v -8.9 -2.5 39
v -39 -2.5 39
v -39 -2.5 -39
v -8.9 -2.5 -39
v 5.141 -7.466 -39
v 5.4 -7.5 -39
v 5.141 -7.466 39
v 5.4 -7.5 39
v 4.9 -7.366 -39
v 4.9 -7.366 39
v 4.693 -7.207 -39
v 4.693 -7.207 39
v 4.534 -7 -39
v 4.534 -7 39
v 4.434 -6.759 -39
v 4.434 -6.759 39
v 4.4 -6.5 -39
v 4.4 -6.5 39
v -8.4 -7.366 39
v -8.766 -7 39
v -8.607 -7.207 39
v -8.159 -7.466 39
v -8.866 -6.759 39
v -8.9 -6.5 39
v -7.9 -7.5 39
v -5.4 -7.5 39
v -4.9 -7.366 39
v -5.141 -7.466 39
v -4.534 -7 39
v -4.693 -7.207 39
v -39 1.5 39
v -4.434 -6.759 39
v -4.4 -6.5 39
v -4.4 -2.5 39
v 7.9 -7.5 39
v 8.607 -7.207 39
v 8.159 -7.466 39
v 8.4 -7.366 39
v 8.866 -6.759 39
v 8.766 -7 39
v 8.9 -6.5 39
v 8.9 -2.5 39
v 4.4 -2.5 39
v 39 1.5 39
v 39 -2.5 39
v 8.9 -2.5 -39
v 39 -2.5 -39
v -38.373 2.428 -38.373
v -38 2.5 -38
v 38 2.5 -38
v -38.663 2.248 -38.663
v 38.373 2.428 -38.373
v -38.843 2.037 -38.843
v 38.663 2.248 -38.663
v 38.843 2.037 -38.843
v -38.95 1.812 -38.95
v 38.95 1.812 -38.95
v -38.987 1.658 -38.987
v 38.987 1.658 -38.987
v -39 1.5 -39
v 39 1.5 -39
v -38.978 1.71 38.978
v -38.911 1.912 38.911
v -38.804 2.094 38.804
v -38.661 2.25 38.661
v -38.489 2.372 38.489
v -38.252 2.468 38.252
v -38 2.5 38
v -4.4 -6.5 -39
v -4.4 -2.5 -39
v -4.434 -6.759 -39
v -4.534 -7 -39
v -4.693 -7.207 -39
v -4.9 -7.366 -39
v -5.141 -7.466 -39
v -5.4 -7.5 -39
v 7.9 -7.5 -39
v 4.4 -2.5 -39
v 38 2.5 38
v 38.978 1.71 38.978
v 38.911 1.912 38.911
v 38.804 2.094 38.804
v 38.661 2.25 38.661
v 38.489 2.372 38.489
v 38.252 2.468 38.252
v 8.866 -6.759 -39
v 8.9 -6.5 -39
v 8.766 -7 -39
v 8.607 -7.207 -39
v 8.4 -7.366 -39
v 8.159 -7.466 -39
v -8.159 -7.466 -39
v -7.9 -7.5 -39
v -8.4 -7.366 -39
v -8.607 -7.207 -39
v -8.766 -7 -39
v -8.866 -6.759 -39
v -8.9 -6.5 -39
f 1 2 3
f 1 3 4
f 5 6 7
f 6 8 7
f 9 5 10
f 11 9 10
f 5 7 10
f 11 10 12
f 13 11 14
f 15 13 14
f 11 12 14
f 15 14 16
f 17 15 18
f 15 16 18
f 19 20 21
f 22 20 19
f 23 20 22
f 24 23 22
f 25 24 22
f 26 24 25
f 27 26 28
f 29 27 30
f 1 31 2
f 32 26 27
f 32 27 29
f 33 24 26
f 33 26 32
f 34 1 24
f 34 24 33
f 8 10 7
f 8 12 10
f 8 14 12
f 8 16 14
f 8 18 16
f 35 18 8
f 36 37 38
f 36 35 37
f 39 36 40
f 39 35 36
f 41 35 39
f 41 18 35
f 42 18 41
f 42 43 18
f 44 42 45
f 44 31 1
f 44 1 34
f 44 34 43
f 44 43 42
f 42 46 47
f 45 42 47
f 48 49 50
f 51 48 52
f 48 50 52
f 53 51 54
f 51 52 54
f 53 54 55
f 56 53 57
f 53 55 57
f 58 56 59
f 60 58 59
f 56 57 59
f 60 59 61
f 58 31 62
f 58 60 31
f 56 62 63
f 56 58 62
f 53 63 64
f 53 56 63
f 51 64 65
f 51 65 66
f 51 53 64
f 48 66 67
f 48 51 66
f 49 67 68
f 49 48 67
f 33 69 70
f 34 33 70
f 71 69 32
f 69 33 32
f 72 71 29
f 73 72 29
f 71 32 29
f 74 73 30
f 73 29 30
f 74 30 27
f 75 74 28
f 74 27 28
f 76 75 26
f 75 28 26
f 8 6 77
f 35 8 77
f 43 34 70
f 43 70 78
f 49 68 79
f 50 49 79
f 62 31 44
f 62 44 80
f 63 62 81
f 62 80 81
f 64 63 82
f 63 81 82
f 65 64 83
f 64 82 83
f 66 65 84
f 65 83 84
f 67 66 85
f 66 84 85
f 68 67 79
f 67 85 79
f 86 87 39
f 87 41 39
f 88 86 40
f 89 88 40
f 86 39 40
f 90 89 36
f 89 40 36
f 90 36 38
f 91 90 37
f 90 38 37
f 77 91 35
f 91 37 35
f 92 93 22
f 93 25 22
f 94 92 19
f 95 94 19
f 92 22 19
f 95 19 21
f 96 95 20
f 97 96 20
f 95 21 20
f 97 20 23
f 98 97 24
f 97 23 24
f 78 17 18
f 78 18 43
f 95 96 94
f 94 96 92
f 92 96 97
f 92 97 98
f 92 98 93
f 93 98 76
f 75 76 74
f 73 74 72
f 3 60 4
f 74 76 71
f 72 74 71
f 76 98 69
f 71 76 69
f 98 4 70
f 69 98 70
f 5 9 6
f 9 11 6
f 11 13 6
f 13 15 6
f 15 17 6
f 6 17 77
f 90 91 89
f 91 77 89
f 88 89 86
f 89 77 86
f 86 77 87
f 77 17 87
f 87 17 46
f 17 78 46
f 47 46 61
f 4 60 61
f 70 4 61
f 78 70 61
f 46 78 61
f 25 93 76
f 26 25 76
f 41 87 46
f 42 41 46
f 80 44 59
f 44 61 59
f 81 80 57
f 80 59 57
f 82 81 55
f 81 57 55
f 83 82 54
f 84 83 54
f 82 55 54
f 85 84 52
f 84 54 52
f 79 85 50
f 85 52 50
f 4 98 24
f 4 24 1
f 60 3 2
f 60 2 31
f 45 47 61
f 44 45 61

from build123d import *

# Parameters (mm, degrees)
SKETCH1_W           = 78
SKETCH1_H           = 5
SKETCH1_W_2         = 4.5
BOSS_EXTRUDE2_DEPTH = 39
FILLET1_R           = 1


with BuildPart() as part:
    # Sketch1 → Boss-Extrude2 (new, symmetric)
    with BuildSketch(Plane.XY):
        Rectangle(SKETCH1_W, SKETCH1_H)
        with Locations((-6.65, -5)):
            Rectangle(SKETCH1_W_2, SKETCH1_H)
        with Locations((6.65, -5)):
            Rectangle(SKETCH1_W_2, SKETCH1_H)
    extrude(amount=BOSS_EXTRUDE2_DEPTH, both=True)

    # Fillet1
    fillet1_edges = [part.edges().sort_by_distance(p)[0] for p in [
        (0, 2.5, 39),
        (0, 2.5, -39),
        (8.9, -7.5, 0),
        (4.4, -7.5, 0),
        (-4.4, -7.5, 0),
        (-8.9, -7.5, 0),
        (-39, 2.5, 0),
        (39, 2.5, 0),
    ]]
    fillet(fillet1_edges, radius=FILLET1_R)


solid = part.part
